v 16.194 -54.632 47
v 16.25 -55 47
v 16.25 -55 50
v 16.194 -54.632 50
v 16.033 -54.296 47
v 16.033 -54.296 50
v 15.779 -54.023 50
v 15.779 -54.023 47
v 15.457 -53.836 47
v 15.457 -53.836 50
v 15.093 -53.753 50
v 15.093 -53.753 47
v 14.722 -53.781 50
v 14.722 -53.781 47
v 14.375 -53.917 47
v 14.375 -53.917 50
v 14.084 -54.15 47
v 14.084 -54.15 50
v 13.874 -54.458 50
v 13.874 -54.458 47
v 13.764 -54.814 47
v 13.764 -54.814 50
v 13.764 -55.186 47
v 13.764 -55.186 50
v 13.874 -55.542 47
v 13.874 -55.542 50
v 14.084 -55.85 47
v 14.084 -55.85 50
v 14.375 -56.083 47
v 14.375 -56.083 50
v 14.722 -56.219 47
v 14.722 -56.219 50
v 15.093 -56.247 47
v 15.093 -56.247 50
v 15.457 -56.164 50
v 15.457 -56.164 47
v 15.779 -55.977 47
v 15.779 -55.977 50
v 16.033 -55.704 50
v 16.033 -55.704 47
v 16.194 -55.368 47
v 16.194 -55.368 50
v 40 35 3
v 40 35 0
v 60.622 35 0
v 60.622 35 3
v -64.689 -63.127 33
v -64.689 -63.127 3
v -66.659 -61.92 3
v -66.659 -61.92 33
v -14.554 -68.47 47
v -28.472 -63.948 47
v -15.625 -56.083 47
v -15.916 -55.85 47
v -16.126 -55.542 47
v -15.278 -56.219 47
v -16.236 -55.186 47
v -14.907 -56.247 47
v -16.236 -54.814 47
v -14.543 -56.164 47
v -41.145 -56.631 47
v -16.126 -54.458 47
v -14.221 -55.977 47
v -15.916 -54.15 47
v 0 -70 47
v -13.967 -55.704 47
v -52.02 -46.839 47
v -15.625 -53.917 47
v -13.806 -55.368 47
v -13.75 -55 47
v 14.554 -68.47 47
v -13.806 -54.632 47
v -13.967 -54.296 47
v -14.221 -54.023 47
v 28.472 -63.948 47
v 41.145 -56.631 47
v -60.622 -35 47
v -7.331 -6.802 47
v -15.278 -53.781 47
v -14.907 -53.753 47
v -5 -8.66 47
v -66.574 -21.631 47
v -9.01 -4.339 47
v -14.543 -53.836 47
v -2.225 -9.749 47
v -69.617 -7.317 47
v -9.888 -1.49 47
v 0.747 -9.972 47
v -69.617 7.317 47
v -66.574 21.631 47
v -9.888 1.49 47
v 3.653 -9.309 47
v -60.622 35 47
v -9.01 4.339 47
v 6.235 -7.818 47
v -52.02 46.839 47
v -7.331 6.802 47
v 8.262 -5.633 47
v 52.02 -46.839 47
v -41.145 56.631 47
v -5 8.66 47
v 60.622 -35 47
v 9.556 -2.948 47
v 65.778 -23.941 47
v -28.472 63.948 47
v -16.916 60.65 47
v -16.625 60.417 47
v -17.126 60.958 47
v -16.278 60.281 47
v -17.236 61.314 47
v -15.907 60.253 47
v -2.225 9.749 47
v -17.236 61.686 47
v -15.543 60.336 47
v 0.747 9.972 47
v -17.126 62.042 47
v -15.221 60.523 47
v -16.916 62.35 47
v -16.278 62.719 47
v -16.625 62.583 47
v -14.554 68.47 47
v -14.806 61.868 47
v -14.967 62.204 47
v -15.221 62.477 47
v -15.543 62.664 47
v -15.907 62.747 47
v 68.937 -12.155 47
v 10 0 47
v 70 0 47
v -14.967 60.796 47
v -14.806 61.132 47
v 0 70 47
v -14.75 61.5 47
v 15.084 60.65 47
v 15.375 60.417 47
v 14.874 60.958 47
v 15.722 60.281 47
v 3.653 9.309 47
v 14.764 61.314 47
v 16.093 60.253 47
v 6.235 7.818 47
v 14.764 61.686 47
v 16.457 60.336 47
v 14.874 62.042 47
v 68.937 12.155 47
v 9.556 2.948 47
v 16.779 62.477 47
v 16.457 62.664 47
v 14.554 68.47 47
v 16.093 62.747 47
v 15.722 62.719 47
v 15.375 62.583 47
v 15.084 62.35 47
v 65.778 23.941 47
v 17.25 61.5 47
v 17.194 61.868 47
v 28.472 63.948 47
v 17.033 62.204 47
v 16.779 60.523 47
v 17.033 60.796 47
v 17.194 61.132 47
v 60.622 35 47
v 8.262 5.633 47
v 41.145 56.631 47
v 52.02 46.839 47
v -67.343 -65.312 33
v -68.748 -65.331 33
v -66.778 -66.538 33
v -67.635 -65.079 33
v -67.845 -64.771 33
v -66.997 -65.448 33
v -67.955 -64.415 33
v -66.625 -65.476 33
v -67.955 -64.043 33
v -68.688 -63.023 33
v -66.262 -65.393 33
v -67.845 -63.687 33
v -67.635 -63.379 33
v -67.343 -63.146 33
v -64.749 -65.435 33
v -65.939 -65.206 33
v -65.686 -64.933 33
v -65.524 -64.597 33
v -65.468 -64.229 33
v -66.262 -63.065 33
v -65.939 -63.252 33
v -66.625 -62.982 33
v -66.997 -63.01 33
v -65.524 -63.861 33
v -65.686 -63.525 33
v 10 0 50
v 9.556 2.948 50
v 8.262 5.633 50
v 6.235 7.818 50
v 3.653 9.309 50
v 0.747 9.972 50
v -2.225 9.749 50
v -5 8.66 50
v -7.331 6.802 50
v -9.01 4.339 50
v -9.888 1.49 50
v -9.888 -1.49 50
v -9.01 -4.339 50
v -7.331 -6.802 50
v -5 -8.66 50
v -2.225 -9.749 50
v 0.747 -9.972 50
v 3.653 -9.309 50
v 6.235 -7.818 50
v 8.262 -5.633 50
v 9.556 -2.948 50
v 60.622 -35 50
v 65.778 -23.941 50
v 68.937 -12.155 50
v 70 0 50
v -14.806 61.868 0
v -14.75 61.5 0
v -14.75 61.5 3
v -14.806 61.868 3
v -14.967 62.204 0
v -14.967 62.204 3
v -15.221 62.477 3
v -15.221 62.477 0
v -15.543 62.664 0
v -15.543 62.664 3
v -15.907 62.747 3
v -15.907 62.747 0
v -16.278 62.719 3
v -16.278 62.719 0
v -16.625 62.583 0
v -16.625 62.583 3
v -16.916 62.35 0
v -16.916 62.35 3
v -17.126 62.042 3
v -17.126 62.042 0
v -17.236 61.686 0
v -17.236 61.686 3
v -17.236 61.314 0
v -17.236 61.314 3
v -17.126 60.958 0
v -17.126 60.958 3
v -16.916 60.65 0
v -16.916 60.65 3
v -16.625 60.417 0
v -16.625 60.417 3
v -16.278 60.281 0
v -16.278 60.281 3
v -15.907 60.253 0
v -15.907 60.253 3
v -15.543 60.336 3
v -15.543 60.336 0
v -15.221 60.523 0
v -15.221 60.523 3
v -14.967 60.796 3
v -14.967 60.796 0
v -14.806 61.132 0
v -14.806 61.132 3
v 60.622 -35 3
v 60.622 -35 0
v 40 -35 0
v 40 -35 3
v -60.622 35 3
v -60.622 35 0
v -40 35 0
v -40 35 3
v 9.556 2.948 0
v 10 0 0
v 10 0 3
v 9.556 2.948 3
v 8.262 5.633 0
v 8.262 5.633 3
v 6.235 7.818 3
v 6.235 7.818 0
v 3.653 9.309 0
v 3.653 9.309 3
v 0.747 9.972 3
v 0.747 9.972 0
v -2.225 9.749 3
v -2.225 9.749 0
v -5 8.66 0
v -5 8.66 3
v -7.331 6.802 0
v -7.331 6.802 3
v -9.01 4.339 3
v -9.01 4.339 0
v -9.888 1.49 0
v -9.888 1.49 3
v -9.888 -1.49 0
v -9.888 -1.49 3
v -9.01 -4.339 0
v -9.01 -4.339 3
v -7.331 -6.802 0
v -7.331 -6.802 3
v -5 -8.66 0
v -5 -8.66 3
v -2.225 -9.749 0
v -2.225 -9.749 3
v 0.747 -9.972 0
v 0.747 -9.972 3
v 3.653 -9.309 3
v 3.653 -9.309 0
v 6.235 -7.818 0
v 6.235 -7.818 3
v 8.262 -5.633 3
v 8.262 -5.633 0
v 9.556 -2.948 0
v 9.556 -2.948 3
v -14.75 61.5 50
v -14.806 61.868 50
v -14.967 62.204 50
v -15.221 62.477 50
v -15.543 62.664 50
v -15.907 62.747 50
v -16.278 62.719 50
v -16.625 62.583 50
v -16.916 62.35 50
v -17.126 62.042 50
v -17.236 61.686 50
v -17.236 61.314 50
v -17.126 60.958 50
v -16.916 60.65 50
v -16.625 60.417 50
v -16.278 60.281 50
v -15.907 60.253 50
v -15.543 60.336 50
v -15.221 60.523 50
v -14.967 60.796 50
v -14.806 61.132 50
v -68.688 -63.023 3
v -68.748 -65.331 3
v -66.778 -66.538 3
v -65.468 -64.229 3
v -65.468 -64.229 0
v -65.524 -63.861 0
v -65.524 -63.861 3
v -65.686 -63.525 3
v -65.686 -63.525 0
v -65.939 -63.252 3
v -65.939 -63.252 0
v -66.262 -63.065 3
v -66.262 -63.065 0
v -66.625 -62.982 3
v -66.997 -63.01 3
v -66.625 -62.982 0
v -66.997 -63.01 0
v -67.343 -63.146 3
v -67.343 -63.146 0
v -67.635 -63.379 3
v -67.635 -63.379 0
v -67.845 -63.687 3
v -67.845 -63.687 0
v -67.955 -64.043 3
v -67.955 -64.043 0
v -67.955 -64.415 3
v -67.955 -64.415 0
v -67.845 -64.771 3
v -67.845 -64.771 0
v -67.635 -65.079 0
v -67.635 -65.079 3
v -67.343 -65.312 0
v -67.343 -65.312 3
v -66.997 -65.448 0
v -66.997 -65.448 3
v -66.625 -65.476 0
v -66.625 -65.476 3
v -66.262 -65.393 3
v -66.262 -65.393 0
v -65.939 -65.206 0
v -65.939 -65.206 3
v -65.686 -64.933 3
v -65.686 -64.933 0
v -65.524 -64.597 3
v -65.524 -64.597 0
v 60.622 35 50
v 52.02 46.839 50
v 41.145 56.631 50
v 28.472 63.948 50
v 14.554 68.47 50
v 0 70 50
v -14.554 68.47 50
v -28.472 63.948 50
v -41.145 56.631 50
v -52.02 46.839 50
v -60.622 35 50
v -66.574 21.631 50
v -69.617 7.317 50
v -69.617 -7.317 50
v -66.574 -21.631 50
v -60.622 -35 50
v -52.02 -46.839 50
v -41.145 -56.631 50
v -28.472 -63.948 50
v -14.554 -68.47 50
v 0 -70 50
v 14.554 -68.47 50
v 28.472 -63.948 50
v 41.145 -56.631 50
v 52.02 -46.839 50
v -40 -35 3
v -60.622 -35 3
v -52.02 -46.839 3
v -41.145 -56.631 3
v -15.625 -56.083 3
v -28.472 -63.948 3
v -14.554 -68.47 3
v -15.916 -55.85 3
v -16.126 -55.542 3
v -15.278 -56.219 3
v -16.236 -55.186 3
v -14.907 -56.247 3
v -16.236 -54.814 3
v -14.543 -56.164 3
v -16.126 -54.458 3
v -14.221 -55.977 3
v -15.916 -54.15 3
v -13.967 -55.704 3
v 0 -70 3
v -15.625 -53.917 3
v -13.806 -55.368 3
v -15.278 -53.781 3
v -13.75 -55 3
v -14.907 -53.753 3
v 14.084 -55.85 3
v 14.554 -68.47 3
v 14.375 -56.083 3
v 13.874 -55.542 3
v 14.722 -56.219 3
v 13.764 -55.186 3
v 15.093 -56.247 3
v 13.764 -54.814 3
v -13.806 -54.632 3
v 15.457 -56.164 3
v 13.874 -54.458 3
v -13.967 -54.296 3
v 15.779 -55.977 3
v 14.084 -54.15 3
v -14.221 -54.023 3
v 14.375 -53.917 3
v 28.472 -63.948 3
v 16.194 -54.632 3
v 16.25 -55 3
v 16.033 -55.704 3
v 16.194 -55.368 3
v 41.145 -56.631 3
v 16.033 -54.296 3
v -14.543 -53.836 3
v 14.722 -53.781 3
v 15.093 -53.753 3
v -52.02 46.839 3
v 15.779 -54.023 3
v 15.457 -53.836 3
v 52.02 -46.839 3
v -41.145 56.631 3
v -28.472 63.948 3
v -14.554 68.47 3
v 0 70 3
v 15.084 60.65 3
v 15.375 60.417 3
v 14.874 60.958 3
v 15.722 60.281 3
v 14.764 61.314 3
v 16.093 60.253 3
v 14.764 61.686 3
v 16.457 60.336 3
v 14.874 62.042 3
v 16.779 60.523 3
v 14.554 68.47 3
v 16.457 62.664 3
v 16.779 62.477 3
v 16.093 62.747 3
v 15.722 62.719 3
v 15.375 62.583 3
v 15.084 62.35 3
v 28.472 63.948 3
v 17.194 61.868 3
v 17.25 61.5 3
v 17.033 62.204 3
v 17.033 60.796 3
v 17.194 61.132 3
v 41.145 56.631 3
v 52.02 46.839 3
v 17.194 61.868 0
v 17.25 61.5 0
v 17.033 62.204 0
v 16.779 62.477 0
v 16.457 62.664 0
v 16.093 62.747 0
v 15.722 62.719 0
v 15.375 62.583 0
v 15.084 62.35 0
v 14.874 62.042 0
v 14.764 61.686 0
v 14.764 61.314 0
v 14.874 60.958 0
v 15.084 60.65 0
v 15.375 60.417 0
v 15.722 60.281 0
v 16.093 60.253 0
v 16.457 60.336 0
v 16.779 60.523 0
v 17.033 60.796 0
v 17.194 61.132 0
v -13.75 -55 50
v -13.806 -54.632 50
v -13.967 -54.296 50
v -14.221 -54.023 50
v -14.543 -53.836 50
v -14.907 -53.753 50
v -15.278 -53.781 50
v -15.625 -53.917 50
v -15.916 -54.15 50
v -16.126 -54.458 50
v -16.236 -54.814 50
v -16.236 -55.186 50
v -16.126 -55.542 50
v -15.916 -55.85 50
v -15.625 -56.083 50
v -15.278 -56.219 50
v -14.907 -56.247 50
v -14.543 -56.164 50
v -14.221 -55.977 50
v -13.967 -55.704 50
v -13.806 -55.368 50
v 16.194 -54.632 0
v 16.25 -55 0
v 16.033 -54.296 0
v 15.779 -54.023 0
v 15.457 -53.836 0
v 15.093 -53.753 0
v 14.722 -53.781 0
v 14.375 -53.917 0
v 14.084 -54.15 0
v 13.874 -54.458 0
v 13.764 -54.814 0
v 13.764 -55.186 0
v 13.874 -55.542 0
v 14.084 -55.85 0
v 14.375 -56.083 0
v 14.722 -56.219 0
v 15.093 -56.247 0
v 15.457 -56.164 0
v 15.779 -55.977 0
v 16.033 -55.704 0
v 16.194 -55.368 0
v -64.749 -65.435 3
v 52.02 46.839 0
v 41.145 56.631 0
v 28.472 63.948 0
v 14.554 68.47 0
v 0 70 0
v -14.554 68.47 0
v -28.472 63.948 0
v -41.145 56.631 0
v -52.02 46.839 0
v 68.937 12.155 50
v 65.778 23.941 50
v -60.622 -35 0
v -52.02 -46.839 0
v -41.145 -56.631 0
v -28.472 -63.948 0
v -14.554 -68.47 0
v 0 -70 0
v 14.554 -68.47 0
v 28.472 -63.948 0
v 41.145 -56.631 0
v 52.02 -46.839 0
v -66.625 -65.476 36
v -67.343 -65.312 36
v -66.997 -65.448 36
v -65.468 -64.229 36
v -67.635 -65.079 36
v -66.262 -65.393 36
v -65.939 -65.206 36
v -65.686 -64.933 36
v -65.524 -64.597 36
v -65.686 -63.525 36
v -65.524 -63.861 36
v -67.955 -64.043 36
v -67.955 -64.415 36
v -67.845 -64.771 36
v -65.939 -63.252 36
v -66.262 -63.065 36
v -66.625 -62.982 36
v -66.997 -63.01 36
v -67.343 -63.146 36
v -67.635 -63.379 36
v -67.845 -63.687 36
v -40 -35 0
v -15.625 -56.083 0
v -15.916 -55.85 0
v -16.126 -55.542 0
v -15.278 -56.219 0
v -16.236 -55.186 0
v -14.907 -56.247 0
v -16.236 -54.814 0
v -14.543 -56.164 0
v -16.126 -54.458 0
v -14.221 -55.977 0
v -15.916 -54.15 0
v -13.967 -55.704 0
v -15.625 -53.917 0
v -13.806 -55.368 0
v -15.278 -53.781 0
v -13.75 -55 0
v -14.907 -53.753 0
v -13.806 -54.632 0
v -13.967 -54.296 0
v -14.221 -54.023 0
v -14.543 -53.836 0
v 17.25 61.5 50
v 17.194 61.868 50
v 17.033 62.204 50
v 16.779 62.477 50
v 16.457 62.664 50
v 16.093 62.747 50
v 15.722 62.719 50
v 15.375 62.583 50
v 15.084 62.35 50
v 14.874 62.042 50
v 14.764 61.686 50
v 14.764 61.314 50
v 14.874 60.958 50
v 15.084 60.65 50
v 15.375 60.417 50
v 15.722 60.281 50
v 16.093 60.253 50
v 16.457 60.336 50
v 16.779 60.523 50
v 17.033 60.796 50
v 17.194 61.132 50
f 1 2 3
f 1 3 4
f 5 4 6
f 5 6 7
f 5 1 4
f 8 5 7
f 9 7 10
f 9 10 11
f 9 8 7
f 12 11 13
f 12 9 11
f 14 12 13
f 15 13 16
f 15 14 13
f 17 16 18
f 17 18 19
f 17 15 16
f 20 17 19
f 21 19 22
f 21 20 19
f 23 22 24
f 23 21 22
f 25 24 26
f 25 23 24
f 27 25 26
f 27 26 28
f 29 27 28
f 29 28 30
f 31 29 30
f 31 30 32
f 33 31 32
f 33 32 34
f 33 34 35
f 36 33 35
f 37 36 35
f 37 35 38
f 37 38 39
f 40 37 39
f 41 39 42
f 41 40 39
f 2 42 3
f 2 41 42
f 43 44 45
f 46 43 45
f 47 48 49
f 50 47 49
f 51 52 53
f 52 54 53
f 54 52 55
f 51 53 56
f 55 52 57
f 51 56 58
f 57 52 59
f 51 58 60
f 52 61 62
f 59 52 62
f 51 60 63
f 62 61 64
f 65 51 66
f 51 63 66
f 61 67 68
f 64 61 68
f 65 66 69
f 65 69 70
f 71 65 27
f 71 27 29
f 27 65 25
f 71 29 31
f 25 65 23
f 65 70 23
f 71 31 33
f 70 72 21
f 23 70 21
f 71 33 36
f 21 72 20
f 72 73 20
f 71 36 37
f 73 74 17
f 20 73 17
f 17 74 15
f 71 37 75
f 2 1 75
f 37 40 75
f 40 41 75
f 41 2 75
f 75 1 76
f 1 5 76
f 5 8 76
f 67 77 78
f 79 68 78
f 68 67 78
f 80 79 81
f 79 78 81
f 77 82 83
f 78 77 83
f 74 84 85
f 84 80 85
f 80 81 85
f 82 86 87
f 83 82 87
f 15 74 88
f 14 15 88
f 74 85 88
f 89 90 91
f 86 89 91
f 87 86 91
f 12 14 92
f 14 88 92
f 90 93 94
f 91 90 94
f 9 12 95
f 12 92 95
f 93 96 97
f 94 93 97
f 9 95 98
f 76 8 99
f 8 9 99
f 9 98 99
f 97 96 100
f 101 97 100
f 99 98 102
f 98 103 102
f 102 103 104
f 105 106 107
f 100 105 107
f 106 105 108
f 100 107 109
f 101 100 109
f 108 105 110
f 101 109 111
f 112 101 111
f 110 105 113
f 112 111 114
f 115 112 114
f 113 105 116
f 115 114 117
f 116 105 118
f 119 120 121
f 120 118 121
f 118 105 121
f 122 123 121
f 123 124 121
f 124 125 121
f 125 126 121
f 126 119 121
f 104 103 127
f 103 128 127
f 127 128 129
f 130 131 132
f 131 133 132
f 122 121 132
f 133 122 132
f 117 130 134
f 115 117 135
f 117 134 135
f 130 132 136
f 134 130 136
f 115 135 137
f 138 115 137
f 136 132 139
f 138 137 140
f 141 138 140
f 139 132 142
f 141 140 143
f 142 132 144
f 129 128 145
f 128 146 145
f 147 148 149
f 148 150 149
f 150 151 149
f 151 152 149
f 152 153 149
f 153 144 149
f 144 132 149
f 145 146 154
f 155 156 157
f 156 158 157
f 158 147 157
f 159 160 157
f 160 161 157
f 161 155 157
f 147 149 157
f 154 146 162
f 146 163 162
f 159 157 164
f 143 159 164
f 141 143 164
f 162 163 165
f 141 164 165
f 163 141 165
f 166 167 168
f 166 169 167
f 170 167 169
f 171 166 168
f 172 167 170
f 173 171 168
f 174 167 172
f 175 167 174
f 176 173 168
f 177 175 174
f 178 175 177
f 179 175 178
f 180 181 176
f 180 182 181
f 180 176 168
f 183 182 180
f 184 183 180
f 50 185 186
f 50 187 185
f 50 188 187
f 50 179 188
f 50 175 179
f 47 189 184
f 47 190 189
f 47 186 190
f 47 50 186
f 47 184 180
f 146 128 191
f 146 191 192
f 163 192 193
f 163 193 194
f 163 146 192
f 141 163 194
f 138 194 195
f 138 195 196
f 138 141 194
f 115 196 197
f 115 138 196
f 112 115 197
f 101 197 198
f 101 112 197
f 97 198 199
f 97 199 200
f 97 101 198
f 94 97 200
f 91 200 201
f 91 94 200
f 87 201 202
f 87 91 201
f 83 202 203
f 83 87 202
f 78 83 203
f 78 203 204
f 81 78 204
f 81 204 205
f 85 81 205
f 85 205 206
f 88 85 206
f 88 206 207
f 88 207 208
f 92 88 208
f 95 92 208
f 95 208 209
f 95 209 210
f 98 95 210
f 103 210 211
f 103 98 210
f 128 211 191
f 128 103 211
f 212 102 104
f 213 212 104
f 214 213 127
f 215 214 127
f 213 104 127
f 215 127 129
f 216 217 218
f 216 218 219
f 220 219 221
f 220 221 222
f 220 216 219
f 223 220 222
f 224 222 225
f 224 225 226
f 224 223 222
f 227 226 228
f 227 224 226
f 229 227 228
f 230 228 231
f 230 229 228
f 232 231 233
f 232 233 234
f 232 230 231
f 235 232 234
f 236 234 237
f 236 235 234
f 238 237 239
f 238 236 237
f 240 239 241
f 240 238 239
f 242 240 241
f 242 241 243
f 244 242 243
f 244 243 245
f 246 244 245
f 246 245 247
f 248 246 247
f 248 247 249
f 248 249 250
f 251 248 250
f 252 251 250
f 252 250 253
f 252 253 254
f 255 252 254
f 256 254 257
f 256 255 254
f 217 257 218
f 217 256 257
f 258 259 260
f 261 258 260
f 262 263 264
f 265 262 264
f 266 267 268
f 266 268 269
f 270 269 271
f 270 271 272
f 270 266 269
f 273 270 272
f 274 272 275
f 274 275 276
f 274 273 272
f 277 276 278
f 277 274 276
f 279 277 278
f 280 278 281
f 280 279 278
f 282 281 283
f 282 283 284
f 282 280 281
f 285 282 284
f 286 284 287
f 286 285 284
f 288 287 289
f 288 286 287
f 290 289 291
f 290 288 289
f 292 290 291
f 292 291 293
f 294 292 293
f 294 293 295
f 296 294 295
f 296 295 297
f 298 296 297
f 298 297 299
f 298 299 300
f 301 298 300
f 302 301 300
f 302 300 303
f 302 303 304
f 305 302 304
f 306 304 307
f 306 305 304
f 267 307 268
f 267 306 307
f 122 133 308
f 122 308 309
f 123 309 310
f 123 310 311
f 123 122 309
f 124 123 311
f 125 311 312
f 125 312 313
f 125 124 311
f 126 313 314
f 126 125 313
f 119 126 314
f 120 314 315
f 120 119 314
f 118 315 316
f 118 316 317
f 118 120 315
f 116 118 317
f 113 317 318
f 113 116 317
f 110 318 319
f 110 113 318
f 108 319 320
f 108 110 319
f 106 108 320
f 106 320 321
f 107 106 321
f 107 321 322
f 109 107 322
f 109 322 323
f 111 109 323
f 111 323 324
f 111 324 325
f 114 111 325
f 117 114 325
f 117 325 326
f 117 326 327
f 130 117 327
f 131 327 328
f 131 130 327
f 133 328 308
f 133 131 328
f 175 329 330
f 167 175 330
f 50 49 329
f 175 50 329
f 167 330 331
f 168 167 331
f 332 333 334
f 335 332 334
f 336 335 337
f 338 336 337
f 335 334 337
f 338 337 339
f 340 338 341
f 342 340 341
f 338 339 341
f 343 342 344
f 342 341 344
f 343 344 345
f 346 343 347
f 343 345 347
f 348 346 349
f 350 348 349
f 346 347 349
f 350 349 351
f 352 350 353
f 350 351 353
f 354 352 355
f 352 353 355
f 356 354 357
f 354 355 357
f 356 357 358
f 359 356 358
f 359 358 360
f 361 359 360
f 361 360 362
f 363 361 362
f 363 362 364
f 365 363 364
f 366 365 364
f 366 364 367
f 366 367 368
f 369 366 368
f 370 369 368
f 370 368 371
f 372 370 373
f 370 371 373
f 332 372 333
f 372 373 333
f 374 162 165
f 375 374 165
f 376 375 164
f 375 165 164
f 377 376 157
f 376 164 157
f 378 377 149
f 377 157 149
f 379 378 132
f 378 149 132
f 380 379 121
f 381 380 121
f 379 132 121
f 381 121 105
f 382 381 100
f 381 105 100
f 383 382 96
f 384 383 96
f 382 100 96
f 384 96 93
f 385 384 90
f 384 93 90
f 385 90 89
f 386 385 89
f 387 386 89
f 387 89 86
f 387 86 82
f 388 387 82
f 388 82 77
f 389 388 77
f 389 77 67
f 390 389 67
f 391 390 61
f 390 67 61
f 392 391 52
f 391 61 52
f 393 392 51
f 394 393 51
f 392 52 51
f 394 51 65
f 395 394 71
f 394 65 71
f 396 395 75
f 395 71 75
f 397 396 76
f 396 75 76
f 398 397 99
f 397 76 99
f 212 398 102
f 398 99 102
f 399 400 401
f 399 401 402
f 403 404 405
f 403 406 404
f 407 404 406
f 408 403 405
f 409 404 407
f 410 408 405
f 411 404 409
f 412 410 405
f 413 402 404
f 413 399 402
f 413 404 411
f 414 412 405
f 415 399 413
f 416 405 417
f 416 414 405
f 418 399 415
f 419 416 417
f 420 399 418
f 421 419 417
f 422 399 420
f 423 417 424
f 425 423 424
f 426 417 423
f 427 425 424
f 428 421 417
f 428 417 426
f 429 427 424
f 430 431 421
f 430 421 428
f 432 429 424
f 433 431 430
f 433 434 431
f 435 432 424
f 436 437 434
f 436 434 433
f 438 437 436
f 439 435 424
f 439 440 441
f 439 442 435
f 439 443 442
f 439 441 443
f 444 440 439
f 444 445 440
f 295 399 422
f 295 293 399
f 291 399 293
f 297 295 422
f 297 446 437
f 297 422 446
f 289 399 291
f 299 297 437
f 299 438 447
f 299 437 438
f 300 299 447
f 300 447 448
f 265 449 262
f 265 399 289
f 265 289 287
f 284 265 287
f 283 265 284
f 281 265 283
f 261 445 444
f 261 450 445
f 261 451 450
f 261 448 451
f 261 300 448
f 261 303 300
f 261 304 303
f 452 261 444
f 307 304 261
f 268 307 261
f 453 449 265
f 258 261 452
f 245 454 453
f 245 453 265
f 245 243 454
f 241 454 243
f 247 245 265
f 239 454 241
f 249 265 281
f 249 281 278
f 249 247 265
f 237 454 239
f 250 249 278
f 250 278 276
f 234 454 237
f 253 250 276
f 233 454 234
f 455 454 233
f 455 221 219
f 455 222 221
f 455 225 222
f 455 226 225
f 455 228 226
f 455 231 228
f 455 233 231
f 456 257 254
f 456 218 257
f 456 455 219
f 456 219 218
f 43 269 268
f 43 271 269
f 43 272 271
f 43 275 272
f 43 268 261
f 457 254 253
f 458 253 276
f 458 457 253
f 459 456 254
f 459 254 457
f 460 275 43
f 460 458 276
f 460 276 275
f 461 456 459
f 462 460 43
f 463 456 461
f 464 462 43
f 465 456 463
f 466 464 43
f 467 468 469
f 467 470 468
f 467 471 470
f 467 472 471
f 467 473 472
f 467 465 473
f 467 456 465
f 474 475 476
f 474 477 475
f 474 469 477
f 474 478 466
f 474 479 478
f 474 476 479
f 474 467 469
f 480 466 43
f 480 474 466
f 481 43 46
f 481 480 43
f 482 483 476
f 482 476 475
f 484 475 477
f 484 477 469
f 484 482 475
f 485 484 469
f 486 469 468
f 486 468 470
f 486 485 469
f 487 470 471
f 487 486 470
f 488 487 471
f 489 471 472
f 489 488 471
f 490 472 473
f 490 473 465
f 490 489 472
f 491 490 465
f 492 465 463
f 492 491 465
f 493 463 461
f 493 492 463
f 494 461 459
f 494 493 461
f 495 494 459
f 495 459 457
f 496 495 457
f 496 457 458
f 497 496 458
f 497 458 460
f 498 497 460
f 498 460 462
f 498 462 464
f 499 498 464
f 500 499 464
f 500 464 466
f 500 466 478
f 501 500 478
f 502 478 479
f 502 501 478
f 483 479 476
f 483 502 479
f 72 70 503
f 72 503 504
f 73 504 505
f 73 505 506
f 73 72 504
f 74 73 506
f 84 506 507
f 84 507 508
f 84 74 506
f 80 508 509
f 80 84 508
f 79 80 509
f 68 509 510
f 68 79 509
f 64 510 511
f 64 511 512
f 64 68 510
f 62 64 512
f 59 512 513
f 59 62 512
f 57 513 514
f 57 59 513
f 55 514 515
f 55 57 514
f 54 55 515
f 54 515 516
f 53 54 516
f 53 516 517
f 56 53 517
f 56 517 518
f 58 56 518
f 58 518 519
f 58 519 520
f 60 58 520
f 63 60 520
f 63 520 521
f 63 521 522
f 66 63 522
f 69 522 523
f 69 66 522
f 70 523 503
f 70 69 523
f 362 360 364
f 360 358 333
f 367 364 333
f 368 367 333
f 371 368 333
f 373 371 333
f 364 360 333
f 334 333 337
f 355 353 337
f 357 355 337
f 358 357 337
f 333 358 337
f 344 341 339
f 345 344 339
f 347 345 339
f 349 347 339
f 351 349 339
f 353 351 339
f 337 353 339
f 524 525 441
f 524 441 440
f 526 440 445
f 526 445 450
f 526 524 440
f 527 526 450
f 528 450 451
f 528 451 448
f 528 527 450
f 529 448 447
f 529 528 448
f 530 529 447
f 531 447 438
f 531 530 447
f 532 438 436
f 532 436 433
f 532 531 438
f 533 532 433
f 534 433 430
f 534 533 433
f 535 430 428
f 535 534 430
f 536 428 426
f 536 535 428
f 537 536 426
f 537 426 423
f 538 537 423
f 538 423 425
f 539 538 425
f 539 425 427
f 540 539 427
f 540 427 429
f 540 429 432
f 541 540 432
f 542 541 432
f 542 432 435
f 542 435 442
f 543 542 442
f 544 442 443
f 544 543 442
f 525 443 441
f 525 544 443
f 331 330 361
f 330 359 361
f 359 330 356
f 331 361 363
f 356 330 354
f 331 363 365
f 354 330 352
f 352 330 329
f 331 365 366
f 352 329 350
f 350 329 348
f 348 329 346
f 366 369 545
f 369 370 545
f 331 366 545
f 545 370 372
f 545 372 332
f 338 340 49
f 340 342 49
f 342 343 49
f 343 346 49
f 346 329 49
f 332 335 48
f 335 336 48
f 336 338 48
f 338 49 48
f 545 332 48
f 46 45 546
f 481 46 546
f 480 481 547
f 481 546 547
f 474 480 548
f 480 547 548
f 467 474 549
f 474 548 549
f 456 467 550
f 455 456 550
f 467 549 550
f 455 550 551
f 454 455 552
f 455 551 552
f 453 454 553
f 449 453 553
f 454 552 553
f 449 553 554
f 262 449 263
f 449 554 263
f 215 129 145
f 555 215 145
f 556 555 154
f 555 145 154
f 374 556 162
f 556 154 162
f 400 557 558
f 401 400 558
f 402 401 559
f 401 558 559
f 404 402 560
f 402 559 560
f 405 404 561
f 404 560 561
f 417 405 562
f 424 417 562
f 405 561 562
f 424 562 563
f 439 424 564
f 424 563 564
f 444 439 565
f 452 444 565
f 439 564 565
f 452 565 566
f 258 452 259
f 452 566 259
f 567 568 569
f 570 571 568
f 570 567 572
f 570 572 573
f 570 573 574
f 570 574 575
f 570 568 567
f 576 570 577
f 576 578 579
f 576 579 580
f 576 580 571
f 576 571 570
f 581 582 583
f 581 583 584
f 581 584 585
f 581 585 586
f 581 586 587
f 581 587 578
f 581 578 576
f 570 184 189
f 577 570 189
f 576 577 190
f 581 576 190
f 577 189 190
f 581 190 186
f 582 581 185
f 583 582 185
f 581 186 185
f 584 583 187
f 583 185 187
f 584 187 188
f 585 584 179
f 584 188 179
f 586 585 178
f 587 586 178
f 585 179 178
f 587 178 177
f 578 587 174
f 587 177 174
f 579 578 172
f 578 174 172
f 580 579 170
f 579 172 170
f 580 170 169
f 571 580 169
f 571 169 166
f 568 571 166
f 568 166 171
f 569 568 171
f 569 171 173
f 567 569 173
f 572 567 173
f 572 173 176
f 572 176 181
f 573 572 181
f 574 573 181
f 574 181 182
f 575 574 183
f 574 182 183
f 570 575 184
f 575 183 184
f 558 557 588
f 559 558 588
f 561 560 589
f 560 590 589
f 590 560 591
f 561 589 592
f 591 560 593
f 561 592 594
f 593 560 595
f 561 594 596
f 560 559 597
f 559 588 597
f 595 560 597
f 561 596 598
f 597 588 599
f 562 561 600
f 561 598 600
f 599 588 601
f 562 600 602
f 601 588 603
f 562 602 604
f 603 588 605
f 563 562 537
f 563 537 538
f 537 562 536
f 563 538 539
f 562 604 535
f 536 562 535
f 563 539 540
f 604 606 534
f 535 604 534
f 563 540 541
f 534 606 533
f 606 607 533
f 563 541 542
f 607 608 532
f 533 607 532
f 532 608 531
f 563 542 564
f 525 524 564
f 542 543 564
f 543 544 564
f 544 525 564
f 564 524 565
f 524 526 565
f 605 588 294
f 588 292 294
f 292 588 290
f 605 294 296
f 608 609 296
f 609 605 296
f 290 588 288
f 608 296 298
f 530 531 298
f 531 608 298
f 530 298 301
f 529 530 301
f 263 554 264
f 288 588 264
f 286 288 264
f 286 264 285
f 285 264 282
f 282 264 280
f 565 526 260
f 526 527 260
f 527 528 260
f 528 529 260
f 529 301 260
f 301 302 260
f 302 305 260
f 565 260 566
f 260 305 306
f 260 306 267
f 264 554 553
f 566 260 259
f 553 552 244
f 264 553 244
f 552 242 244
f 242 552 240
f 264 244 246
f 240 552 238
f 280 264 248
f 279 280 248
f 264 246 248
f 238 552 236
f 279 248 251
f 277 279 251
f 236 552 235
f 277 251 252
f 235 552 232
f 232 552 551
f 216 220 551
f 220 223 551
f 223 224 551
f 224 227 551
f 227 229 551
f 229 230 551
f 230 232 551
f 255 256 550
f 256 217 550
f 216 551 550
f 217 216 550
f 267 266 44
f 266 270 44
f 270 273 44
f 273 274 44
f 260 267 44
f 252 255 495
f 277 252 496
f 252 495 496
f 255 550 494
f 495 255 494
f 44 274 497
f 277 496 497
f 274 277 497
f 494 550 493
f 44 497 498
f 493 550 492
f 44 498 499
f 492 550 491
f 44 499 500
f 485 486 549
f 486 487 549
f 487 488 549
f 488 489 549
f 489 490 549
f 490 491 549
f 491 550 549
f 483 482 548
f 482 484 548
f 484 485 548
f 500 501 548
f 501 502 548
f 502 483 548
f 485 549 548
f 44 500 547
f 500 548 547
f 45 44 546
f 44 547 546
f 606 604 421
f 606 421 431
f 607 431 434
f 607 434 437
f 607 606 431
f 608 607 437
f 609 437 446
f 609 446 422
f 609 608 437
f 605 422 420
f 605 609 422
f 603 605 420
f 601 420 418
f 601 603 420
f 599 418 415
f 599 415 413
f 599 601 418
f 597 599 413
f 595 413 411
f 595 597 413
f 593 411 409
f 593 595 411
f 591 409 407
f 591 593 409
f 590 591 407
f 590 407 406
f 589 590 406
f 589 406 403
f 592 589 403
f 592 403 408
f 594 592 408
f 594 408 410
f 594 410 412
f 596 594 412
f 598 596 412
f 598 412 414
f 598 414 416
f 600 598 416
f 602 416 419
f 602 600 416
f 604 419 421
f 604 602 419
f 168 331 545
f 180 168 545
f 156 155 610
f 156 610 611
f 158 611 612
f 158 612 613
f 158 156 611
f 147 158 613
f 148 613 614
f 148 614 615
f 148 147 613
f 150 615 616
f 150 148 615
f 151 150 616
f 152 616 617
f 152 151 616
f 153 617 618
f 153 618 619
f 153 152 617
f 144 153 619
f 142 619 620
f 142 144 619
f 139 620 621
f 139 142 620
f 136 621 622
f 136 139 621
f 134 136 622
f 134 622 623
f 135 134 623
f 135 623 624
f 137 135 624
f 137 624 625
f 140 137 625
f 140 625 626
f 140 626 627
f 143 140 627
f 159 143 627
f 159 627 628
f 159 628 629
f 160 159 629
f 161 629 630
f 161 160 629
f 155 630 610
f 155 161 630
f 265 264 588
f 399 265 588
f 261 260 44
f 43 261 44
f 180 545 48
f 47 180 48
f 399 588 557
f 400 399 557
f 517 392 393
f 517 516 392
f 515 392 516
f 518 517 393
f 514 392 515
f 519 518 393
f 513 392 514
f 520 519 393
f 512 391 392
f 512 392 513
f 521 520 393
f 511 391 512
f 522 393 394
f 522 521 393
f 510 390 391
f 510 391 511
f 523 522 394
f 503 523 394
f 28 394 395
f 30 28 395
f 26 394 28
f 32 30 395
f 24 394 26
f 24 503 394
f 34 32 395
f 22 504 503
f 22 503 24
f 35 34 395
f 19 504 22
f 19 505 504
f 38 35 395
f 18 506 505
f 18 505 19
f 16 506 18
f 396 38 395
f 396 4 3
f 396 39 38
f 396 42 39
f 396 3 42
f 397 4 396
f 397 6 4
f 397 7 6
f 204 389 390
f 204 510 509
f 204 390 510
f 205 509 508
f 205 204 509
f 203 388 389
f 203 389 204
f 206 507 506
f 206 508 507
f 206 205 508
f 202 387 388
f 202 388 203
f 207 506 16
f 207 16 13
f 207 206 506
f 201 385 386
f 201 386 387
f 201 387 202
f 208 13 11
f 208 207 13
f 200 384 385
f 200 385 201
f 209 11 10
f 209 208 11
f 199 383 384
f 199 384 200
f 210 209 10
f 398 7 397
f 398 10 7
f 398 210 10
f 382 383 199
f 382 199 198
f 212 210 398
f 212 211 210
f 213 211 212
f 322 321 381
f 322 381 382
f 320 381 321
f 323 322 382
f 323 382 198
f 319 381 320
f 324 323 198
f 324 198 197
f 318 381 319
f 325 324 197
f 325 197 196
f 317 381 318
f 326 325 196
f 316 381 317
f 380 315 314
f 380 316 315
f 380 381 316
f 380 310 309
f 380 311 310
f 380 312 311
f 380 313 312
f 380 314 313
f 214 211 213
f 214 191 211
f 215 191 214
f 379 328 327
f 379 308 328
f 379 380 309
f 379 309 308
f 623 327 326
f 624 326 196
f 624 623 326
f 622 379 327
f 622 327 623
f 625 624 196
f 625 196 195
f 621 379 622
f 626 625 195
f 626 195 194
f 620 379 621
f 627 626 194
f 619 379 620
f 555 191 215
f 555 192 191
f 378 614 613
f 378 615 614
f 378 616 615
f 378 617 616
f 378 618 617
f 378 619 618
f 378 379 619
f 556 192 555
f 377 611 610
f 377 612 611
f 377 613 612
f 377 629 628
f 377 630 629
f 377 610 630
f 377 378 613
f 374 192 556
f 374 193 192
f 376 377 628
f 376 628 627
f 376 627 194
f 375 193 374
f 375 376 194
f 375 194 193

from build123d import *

# Parameters (mm, degrees)
F0_R     = 1.25
F0_R_2   = 10
F1_DEPTH = 3
F2_START = 47
F2_DEPTH = 3
F3_R     = 1.25
F4_DEPTH = 3
F6_DEPTH = 30
F7_R     = 1.25
F8_DEPTH = 3


with BuildPart() as f1:
    # F0 (on Top) → F1 (new body)
    with BuildSketch(Plane.XY):
        with BuildLine():
            Line((40, 35), (60.6217782649, 35))
            ThreePointArc((60.6217782649, 35), (0, 70), (-60.6217782649, 35))
            Line((-60.6217782649, 35), (-40, 35))
            Line((-40, 35), (-40, -35))
            Line((-40, -35), (-60.6217782649, -35))
            ThreePointArc((-60.6217782649, -35), (0, -70), (60.6217782649, -35))
            Line((60.6217782649, -35), (40, -35))
            Line((40, -35), (40, 35))
        make_face()
        with Locations((-15, -55)):
            Circle(F0_R, mode=Mode.SUBTRACT)
        with Locations((15, -55)):
            Circle(F0_R, mode=Mode.SUBTRACT)
        with Locations((-16, 61.5)):
            Circle(F0_R, mode=Mode.SUBTRACT)
        Circle(F0_R_2, mode=Mode.SUBTRACT)
        with Locations((16, 61.5)):
            Circle(F0_R, mode=Mode.SUBTRACT)
    extrude(amount=F1_DEPTH)


with BuildPart() as f2:
    # F0 (on Top) → F2 (new body)
    with BuildSketch(Plane.XY.offset(F2_START)):
        with BuildLine():
            Line((-40, 35), (-60.6217782649, 35))
            ThreePointArc((-60.6217782649, 35), (-70, 0), (-60.6217782649, -35))
            Line((-60.6217782649, -35), (-40, -35))
            Line((-40, -35), (-40, 35))
        make_face()
        with BuildLine():
            Line((40, 35), (60.6217782649, 35))
            ThreePointArc((60.6217782649, 35), (0, 70), (-60.6217782649, 35))
            Line((-60.6217782649, 35), (-40, 35))
            Line((-40, 35), (-40, -35))
            Line((-40, -35), (-60.6217782649, -35))
            ThreePointArc((-60.6217782649, -35), (0, -70), (60.6217782649, -35))
            Line((60.6217782649, -35), (40, -35))
            Line((40, -35), (40, 35))
        make_face()
        with Locations((-15, -55)):
            Circle(F0_R, mode=Mode.SUBTRACT)
        with Locations((15, -55)):
            Circle(F0_R, mode=Mode.SUBTRACT)
        with Locations((-16, 61.5)):
            Circle(F0_R, mode=Mode.SUBTRACT)
        Circle(F0_R_2, mode=Mode.SUBTRACT)
        with Locations((16, 61.5)):
            Circle(F0_R, mode=Mode.SUBTRACT)
        with BuildLine():
            ThreePointArc((60.6217782649, -35), (67.6148078402, -18.1173331572), (70, 0))
            ThreePointArc((70, 0), (67.6148078402, 18.1173331572), (60.6217782649, 35))
            Line((60.6217782649, 35), (40, 35))
            Line((40, 35), (40, -35))
            Line((40, -35), (60.6217782649, -35))
        make_face()
    extrude(amount=F2_DEPTH)


with BuildPart() as f4:
    # F3 (on Top) → F4 (new body)
    with BuildSketch(Plane.XY):
        with Locations((-66.7184889317, -64.2290040851)):
            Circle(F3_R)
    extrude(amount=F4_DEPTH)

    # F5 (on face) → F6 (join)
    with BuildSketch(Plane.XY.offset(3)):
        Polygon((-66.7783611943, -66.5376289237), (-64.7490973049, -65.4351674048), (-64.6892250423, -63.1265425661), (-66.6586166691, -61.9203792464), (-68.6878805584, -63.0228407654), (-68.747752821, -65.331465604), align=None)
    extrude(amount=F6_DEPTH)

    # F7 (on face) → F8 (join)
    with BuildSketch(Plane.XY.offset(33)):
        with Locations((-66.7184889317, -64.2290040851)):
            Circle(F7_R)
    extrude(amount=F8_DEPTH)


solid = Compound([f1.part, f2.part, f4.part])
